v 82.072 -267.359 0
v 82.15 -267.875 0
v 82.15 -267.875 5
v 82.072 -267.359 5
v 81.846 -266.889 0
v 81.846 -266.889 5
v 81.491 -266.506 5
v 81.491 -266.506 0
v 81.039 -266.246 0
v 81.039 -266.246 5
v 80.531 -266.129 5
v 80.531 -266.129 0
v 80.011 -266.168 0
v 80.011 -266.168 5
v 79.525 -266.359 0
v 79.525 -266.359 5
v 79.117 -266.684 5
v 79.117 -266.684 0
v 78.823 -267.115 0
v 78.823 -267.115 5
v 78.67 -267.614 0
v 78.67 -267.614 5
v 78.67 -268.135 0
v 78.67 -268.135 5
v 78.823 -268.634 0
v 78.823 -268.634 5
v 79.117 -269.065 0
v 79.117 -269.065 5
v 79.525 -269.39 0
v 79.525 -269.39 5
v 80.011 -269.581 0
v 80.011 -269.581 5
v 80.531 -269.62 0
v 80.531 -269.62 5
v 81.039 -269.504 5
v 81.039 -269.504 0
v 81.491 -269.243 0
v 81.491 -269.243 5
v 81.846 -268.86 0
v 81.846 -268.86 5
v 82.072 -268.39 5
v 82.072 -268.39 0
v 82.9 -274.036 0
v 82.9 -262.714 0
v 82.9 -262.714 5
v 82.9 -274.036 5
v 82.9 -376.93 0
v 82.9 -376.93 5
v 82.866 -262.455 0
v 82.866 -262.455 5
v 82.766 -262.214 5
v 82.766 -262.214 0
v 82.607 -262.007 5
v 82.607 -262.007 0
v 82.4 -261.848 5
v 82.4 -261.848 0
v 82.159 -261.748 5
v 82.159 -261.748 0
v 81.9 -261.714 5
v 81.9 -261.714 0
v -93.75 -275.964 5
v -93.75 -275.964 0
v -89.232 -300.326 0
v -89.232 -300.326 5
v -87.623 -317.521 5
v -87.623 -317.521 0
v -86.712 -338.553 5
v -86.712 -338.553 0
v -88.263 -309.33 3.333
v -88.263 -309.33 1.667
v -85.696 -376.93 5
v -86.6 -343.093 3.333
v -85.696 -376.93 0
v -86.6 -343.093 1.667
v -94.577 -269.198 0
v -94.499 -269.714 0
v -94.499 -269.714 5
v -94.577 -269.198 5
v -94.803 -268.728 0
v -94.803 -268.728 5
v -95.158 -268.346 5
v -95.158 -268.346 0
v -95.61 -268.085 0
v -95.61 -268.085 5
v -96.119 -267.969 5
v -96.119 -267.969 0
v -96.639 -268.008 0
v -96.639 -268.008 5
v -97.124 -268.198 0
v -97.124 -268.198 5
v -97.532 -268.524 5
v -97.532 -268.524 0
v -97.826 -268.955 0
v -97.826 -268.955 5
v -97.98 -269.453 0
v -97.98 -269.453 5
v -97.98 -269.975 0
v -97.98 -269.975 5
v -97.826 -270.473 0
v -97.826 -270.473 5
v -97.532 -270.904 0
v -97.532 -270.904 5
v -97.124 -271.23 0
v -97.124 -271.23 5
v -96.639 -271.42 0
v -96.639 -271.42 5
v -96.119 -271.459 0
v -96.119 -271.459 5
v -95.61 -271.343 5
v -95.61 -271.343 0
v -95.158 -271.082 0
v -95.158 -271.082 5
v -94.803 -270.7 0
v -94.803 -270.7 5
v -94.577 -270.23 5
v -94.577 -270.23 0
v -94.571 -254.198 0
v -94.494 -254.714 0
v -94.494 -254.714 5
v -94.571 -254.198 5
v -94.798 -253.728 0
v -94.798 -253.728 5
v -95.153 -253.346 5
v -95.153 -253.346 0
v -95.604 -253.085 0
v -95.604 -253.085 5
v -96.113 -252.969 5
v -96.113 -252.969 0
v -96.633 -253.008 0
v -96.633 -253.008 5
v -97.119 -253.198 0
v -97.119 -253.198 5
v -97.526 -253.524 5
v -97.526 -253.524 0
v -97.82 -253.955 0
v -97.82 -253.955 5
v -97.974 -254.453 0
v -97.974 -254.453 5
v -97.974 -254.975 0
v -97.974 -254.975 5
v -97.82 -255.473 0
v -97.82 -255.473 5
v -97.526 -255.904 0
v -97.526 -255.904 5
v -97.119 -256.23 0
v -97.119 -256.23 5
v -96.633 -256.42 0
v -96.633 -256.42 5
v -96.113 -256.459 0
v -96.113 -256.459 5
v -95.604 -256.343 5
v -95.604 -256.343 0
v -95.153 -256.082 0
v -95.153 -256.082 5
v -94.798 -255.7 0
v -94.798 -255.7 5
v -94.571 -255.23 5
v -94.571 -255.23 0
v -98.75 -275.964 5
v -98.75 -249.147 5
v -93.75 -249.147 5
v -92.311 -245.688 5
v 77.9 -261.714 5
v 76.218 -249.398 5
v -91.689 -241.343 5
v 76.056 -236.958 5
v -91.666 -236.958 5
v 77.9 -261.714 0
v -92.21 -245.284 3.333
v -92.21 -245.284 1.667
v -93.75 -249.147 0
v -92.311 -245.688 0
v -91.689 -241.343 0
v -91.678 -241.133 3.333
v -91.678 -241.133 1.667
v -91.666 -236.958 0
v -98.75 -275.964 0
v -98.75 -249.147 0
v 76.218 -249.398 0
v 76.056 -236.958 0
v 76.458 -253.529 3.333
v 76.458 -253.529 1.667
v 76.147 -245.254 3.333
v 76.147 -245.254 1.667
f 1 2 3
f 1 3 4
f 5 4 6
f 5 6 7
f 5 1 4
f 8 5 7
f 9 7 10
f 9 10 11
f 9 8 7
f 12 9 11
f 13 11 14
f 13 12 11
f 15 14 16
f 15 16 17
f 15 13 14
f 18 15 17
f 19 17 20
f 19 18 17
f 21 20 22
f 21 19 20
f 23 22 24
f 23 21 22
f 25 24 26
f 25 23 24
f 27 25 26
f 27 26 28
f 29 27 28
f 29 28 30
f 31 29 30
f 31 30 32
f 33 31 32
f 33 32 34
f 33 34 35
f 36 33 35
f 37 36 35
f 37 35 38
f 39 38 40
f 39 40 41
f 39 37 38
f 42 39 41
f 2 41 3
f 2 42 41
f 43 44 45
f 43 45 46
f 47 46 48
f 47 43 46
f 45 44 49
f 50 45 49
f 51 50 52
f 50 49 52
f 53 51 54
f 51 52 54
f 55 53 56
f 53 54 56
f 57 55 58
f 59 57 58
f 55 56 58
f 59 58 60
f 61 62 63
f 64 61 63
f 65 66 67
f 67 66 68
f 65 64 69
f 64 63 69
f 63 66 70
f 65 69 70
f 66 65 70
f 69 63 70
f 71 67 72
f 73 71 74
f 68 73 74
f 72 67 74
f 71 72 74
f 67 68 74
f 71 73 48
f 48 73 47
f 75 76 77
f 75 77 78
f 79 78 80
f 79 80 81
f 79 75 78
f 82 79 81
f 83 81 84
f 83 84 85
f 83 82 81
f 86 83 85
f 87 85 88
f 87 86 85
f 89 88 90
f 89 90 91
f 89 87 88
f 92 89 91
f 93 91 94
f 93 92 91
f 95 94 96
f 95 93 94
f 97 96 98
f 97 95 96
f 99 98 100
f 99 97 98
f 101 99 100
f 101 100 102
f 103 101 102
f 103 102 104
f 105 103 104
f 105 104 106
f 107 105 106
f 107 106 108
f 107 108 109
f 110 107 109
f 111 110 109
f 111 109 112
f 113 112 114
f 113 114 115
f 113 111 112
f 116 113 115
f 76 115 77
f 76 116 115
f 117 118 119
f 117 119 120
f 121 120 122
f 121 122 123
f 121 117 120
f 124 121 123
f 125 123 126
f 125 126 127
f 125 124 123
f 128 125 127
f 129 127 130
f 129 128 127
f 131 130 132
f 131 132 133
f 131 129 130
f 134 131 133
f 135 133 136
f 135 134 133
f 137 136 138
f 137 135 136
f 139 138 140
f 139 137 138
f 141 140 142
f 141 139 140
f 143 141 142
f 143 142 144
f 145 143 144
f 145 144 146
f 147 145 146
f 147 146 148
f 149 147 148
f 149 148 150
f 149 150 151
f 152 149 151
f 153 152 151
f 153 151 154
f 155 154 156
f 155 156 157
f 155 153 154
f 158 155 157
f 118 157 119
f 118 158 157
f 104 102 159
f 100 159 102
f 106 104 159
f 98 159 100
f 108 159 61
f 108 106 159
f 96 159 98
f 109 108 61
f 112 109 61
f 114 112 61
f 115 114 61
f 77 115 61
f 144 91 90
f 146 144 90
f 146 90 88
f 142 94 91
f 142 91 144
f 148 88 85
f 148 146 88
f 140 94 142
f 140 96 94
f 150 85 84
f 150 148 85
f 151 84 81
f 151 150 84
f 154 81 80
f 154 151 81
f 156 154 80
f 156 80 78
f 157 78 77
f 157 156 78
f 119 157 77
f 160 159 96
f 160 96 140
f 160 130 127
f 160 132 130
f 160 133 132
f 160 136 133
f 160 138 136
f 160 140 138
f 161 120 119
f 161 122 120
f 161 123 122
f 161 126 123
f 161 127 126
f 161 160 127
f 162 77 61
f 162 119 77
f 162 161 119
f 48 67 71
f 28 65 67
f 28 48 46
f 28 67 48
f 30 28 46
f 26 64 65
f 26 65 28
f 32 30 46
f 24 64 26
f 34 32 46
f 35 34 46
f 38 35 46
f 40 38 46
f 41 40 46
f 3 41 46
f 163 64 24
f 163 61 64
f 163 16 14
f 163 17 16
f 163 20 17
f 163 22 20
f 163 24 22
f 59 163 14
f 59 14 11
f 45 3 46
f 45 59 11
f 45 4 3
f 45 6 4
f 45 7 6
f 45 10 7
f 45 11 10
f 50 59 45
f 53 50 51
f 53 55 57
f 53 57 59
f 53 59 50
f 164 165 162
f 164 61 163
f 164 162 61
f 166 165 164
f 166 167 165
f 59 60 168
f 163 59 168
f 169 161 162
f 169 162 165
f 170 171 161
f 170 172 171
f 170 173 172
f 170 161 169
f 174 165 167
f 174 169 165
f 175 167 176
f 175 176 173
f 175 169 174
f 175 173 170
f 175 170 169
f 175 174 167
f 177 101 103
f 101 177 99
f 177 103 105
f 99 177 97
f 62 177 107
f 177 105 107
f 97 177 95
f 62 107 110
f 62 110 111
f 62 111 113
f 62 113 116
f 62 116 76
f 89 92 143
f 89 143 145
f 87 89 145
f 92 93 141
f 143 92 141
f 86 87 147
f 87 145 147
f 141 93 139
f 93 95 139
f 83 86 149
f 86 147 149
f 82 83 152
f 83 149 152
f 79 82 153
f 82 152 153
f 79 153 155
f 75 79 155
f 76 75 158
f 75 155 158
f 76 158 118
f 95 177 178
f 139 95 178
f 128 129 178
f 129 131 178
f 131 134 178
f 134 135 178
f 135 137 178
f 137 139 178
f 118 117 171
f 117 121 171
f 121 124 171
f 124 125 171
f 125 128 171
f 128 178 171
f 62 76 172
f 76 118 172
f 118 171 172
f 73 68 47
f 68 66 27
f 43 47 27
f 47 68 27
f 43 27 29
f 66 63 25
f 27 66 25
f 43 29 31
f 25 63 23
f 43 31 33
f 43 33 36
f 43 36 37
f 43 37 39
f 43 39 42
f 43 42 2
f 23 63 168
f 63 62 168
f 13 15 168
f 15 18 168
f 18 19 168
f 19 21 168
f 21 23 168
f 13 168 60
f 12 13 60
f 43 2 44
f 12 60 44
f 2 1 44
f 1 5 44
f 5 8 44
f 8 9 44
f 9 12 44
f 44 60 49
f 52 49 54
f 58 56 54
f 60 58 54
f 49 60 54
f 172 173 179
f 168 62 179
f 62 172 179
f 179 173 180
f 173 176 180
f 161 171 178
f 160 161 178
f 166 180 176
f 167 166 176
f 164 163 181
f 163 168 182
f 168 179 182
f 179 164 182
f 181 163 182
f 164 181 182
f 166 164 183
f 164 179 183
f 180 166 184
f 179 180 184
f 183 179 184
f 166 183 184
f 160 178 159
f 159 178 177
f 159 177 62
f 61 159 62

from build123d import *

# Parameters (mm, degrees)
SKETCH1_R           = 1.75
BOSS_EXTRUDE1_DEPTH = 5


with BuildPart() as part:
    # Sketch1 → Boss-Extrude1 (new body)
    with BuildSketch(Plane.XY):
        with BuildLine():
            Line((-93.75, -249.14706128), (-98.75, -249.14706128))
            Line((-98.75, -249.14706128), (-98.75, -275.963602955))
            Line((-98.75, -275.963602955), (-93.75, -275.963602955))
            add(Edge.make_bspline(
                [(-93.75, -275.963602955), (-85.328784133, -309.023467032), (-87.242655609, -343.164760507), (-85.696102167, -376.929671114)],
                knots=[0, 0, 0, 0, 1, 1, 1, 1], degree=3))
            Line((-85.696102167, -376.929671114), (82.9, -376.929671114))
            add(Edge.make_bspline(
                [(82.9, -274.035506052), (82.9, -308.333561073), (82.9, -342.631616093), (82.9, -376.929671114)],
                knots=[0, 0, 0, 0, 1, 1, 1, 1], degree=3))
            Line((82.9, -274.035506052), (82.9, -262.713680137))
            ThreePointArc((82.9, -262.713680137), (82.607106781, -262.006573355), (81.9, -261.713680137))
            Line((81.9, -261.713680137), (77.9, -261.713680137))
            add(Edge.make_bspline(
                [(77.9, -261.713680137), (75.588198468, -253.598889885), (76.340151595, -245.239667724), (76.055808767, -236.957982208)],
                knots=[0, 0, 0, 0, 1, 1, 1, 1], degree=3))
            Line((76.055808767, -236.957982208), (-91.666234566, -236.957982208))
            add(Edge.make_bspline(
                [(-93.75, -249.14706128), (-91.542697993, -245.516719889), (-91.581655695, -241.056968833), (-91.666234566, -236.957982208)],
                knots=[0, 0, 0, 0, 1, 1, 1, 1], degree=3))
        make_face()
        with Locations((-96.249351551, -269.713963286)):
            Circle(SKETCH1_R, mode=Mode.SUBTRACT)
        with Locations((-96.243654126, -254.713964368)):
            Circle(SKETCH1_R, mode=Mode.SUBTRACT)
        with Locations((80.4, -267.874593094)):
            Circle(SKETCH1_R, mode=Mode.SUBTRACT)
    extrude(amount=BOSS_EXTRUDE1_DEPTH)


solid = part.part
